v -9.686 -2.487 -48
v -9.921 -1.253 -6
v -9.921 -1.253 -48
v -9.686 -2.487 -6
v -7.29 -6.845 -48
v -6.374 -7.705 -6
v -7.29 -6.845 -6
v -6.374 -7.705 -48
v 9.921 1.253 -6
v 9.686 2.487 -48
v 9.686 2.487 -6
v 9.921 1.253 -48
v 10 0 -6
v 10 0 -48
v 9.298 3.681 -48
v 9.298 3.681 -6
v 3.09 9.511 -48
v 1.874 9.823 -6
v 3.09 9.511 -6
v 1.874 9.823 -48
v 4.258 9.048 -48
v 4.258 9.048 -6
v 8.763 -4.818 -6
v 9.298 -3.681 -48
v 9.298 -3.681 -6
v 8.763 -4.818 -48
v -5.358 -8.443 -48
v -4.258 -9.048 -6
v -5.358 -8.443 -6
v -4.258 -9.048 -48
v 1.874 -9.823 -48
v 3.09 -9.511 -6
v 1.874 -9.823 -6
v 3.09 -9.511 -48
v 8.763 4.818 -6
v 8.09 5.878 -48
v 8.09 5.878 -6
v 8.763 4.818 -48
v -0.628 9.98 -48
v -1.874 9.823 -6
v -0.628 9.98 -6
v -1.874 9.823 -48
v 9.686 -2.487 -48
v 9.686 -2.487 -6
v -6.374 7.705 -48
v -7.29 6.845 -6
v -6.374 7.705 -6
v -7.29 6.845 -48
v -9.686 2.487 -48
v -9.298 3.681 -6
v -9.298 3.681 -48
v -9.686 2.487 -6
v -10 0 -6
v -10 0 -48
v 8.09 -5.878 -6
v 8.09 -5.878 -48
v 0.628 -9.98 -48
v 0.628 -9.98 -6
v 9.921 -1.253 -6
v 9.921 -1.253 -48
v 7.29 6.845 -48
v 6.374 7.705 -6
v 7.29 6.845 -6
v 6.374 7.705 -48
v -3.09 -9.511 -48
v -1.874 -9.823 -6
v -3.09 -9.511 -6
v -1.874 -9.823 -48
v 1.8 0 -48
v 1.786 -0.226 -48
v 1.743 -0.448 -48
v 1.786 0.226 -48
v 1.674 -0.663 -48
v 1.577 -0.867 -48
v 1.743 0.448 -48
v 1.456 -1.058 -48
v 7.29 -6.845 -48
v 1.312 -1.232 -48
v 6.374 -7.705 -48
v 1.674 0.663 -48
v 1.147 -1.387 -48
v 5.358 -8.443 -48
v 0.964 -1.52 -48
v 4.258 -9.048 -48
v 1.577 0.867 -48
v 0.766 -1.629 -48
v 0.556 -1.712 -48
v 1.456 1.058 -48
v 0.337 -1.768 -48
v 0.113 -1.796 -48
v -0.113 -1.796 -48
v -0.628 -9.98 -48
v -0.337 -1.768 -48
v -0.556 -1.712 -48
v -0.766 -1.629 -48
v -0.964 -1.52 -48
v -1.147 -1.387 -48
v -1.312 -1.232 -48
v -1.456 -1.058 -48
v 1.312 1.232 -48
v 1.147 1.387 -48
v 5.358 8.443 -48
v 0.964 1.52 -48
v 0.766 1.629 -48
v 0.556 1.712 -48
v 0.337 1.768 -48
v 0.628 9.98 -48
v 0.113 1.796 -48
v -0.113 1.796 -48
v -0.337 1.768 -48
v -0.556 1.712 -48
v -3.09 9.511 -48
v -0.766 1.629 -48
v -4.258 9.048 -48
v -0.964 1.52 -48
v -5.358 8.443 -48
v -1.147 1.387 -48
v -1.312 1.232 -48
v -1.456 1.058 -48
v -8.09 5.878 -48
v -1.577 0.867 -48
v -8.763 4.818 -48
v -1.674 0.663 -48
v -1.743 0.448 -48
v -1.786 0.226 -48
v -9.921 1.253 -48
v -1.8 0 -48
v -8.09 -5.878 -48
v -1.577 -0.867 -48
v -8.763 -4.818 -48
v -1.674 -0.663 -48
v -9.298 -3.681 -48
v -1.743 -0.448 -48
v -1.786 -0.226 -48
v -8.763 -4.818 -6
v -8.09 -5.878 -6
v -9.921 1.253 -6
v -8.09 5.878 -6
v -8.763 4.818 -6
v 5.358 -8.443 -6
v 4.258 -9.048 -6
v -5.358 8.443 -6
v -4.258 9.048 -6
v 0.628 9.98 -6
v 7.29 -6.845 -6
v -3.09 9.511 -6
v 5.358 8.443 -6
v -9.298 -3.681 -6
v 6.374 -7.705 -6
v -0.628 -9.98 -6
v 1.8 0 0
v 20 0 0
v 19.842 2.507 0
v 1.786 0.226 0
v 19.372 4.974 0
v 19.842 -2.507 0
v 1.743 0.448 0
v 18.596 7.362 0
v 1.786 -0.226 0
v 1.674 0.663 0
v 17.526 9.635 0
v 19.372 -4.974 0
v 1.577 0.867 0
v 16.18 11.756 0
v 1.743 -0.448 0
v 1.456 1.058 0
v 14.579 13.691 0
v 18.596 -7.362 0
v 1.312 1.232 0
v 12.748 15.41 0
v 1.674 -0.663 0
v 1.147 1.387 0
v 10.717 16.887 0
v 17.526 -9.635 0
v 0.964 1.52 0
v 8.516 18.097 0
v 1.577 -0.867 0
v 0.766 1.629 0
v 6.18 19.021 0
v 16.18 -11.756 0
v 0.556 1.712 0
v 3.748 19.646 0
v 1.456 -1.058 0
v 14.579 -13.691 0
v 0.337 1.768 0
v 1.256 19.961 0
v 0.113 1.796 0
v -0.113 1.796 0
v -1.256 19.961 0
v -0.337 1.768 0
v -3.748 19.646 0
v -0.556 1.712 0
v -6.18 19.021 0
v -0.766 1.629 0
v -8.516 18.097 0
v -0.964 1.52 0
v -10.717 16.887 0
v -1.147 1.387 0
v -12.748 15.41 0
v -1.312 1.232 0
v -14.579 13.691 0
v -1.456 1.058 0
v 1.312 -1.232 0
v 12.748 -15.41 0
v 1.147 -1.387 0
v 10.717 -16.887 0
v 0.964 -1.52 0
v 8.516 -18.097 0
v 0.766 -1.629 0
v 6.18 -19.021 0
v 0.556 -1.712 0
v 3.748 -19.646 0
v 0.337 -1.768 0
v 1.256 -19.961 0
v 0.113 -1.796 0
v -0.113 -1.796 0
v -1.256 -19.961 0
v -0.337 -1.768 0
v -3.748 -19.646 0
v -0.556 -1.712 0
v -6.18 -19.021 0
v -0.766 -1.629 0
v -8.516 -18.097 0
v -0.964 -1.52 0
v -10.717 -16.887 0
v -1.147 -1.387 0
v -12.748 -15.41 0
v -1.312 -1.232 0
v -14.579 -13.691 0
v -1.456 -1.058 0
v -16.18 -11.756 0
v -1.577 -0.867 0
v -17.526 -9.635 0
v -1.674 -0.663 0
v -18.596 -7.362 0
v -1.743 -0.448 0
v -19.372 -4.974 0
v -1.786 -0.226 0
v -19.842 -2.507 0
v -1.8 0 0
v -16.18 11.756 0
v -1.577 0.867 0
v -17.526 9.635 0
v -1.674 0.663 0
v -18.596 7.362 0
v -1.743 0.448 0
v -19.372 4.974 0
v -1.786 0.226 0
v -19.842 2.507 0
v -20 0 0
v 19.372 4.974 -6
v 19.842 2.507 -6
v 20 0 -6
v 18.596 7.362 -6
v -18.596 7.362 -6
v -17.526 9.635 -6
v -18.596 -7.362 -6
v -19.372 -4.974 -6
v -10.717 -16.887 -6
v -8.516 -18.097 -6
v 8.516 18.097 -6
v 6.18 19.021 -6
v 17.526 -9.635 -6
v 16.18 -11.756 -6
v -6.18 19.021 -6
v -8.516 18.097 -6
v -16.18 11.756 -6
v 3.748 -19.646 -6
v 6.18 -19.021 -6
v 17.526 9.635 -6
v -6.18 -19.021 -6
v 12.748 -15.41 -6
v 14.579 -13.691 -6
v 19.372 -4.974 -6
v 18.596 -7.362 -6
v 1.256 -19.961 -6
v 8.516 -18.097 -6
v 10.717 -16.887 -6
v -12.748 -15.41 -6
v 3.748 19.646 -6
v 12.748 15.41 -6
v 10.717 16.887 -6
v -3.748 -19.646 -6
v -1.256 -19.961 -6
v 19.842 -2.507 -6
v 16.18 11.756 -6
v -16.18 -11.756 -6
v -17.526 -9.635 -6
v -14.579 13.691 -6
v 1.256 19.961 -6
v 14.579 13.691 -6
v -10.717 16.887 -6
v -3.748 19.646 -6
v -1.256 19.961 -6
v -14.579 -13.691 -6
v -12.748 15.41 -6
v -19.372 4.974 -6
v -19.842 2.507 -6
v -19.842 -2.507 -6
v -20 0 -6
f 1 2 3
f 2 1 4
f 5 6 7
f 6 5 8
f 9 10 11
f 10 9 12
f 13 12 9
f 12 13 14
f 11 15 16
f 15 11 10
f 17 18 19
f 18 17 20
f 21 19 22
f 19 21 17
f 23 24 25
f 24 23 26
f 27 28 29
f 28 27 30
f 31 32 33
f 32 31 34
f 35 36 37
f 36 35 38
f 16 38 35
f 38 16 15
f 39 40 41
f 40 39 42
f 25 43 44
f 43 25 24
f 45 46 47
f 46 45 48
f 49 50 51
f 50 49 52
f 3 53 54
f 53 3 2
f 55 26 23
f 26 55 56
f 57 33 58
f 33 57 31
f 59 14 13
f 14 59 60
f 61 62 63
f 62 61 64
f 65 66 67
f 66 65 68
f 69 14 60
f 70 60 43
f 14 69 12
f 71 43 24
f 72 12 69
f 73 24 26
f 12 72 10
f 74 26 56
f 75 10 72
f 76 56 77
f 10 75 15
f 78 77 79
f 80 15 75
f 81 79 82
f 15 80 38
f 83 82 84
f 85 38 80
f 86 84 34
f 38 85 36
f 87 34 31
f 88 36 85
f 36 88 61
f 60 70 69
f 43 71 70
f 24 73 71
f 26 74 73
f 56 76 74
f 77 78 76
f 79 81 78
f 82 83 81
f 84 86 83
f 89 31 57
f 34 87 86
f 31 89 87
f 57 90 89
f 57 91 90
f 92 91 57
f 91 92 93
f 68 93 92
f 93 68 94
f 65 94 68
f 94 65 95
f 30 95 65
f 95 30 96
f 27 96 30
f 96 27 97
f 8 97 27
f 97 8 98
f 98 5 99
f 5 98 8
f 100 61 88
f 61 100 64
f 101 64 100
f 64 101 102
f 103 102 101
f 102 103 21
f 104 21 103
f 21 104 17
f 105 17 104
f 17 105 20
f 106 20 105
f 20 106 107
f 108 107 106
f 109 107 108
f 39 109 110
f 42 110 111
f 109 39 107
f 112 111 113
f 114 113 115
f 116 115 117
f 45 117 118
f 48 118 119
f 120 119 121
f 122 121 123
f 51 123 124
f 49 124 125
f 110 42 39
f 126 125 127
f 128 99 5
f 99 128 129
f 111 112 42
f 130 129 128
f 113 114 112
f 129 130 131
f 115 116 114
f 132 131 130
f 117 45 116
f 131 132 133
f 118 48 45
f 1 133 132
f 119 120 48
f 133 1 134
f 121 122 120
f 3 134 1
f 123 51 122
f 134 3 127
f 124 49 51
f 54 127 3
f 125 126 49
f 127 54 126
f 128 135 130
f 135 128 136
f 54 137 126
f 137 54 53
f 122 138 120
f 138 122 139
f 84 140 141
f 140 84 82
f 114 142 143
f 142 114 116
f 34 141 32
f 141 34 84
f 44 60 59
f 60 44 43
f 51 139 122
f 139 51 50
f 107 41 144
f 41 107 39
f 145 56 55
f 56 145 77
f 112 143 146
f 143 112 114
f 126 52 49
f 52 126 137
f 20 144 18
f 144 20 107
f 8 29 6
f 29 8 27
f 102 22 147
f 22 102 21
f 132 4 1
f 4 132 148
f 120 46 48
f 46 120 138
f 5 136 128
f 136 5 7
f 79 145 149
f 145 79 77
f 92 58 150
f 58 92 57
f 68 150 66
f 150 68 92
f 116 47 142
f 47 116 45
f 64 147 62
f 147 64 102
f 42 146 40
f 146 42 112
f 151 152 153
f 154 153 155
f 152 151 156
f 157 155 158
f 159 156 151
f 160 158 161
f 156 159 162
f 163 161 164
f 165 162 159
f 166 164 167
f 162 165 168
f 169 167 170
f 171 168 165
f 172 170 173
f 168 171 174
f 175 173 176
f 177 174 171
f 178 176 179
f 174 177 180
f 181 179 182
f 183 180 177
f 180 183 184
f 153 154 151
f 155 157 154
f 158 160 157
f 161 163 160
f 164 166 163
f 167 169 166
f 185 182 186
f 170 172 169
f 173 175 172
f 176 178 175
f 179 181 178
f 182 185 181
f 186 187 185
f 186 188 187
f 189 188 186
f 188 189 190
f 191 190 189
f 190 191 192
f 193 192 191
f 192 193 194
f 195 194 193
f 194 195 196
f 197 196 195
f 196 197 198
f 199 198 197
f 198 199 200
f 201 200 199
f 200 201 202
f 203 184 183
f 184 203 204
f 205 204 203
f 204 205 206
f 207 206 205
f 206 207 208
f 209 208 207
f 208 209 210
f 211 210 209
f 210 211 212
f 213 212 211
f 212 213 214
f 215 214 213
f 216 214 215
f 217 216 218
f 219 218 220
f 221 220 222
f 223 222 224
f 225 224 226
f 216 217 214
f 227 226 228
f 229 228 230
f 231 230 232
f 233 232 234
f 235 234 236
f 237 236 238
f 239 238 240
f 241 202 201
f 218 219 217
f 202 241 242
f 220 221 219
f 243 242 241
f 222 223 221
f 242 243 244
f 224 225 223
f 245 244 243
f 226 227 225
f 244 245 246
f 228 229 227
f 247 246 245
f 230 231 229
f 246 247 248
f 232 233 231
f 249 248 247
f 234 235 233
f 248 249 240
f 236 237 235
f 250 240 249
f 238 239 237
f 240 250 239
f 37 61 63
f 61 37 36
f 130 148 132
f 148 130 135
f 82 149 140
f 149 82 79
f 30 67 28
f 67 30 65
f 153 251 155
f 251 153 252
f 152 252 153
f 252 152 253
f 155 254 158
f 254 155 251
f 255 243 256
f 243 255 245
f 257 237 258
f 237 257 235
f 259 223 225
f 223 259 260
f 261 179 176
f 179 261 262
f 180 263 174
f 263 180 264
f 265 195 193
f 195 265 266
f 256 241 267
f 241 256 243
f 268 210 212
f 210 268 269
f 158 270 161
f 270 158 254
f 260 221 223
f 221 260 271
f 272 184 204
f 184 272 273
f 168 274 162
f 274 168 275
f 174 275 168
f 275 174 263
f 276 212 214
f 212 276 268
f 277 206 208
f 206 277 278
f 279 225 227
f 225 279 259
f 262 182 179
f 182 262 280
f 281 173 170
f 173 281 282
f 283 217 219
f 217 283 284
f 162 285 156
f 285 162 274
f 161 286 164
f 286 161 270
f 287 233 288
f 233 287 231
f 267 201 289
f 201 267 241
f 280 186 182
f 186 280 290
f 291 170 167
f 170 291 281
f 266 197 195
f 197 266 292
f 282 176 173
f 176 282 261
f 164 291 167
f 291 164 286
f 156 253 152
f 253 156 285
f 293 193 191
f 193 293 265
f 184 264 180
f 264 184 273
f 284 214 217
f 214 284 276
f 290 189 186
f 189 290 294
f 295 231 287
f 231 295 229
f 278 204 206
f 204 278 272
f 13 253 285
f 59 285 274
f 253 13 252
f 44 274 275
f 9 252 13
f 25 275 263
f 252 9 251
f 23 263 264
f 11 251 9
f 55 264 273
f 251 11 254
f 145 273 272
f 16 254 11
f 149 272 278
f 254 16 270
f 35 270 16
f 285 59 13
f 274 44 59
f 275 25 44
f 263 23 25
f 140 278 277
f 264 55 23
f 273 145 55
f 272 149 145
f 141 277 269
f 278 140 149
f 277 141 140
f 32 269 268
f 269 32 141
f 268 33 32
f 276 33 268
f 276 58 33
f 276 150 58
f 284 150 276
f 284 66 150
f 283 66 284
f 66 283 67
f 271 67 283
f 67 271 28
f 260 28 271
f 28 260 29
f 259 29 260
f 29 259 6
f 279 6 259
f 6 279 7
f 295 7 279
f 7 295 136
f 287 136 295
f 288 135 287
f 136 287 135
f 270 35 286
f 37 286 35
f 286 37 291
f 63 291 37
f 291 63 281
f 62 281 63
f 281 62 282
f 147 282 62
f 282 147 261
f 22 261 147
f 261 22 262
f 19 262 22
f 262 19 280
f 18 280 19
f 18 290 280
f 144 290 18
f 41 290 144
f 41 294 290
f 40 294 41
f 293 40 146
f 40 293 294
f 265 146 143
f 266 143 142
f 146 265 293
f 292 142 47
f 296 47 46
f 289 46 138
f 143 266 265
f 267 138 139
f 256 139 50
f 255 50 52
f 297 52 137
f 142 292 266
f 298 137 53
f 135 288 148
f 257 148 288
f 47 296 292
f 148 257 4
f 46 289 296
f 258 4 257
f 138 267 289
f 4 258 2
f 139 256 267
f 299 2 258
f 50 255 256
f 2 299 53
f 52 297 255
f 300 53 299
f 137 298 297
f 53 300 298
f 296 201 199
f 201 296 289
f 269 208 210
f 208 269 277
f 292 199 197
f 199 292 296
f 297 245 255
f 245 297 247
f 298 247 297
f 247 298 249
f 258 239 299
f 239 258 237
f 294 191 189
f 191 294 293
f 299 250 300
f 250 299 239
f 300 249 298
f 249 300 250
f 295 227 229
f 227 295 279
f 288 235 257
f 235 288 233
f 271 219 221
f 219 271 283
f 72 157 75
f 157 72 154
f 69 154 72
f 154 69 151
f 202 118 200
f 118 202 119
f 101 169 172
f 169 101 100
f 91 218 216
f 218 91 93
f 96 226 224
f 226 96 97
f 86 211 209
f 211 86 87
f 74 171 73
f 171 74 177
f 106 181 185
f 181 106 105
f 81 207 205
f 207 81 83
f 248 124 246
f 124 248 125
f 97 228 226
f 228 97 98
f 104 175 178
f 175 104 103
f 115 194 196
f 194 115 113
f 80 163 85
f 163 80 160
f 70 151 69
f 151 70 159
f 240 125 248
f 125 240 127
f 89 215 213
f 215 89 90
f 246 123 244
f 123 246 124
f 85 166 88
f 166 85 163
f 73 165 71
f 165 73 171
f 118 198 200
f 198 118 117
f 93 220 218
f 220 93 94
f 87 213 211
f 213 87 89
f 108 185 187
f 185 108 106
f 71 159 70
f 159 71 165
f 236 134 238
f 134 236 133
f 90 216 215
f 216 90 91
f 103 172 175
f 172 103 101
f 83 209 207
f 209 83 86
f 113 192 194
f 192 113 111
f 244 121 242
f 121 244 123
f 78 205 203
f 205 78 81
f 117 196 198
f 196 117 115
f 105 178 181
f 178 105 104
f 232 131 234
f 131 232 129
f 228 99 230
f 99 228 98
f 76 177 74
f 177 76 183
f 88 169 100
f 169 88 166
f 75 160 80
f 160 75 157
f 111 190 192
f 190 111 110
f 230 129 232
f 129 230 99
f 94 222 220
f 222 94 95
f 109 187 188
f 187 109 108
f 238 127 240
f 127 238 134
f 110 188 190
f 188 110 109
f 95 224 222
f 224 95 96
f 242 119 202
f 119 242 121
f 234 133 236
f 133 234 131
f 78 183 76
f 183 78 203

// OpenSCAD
$fn = 50;


difference() {
	union() {
		translate(v = [0, 0, -48.0000000000]) {
			cylinder(h = 48, r = 10.0000000000);
		}
		translate(v = [0, 0, -6.0000000000]) {
			cylinder(h = 6, r = 20.0000000000);
		}
	}
	union() {
		#translate(v = [0, 0, -48]) {
			cylinder(h = 48, r = 1.8000000000);
		}
	}
}
